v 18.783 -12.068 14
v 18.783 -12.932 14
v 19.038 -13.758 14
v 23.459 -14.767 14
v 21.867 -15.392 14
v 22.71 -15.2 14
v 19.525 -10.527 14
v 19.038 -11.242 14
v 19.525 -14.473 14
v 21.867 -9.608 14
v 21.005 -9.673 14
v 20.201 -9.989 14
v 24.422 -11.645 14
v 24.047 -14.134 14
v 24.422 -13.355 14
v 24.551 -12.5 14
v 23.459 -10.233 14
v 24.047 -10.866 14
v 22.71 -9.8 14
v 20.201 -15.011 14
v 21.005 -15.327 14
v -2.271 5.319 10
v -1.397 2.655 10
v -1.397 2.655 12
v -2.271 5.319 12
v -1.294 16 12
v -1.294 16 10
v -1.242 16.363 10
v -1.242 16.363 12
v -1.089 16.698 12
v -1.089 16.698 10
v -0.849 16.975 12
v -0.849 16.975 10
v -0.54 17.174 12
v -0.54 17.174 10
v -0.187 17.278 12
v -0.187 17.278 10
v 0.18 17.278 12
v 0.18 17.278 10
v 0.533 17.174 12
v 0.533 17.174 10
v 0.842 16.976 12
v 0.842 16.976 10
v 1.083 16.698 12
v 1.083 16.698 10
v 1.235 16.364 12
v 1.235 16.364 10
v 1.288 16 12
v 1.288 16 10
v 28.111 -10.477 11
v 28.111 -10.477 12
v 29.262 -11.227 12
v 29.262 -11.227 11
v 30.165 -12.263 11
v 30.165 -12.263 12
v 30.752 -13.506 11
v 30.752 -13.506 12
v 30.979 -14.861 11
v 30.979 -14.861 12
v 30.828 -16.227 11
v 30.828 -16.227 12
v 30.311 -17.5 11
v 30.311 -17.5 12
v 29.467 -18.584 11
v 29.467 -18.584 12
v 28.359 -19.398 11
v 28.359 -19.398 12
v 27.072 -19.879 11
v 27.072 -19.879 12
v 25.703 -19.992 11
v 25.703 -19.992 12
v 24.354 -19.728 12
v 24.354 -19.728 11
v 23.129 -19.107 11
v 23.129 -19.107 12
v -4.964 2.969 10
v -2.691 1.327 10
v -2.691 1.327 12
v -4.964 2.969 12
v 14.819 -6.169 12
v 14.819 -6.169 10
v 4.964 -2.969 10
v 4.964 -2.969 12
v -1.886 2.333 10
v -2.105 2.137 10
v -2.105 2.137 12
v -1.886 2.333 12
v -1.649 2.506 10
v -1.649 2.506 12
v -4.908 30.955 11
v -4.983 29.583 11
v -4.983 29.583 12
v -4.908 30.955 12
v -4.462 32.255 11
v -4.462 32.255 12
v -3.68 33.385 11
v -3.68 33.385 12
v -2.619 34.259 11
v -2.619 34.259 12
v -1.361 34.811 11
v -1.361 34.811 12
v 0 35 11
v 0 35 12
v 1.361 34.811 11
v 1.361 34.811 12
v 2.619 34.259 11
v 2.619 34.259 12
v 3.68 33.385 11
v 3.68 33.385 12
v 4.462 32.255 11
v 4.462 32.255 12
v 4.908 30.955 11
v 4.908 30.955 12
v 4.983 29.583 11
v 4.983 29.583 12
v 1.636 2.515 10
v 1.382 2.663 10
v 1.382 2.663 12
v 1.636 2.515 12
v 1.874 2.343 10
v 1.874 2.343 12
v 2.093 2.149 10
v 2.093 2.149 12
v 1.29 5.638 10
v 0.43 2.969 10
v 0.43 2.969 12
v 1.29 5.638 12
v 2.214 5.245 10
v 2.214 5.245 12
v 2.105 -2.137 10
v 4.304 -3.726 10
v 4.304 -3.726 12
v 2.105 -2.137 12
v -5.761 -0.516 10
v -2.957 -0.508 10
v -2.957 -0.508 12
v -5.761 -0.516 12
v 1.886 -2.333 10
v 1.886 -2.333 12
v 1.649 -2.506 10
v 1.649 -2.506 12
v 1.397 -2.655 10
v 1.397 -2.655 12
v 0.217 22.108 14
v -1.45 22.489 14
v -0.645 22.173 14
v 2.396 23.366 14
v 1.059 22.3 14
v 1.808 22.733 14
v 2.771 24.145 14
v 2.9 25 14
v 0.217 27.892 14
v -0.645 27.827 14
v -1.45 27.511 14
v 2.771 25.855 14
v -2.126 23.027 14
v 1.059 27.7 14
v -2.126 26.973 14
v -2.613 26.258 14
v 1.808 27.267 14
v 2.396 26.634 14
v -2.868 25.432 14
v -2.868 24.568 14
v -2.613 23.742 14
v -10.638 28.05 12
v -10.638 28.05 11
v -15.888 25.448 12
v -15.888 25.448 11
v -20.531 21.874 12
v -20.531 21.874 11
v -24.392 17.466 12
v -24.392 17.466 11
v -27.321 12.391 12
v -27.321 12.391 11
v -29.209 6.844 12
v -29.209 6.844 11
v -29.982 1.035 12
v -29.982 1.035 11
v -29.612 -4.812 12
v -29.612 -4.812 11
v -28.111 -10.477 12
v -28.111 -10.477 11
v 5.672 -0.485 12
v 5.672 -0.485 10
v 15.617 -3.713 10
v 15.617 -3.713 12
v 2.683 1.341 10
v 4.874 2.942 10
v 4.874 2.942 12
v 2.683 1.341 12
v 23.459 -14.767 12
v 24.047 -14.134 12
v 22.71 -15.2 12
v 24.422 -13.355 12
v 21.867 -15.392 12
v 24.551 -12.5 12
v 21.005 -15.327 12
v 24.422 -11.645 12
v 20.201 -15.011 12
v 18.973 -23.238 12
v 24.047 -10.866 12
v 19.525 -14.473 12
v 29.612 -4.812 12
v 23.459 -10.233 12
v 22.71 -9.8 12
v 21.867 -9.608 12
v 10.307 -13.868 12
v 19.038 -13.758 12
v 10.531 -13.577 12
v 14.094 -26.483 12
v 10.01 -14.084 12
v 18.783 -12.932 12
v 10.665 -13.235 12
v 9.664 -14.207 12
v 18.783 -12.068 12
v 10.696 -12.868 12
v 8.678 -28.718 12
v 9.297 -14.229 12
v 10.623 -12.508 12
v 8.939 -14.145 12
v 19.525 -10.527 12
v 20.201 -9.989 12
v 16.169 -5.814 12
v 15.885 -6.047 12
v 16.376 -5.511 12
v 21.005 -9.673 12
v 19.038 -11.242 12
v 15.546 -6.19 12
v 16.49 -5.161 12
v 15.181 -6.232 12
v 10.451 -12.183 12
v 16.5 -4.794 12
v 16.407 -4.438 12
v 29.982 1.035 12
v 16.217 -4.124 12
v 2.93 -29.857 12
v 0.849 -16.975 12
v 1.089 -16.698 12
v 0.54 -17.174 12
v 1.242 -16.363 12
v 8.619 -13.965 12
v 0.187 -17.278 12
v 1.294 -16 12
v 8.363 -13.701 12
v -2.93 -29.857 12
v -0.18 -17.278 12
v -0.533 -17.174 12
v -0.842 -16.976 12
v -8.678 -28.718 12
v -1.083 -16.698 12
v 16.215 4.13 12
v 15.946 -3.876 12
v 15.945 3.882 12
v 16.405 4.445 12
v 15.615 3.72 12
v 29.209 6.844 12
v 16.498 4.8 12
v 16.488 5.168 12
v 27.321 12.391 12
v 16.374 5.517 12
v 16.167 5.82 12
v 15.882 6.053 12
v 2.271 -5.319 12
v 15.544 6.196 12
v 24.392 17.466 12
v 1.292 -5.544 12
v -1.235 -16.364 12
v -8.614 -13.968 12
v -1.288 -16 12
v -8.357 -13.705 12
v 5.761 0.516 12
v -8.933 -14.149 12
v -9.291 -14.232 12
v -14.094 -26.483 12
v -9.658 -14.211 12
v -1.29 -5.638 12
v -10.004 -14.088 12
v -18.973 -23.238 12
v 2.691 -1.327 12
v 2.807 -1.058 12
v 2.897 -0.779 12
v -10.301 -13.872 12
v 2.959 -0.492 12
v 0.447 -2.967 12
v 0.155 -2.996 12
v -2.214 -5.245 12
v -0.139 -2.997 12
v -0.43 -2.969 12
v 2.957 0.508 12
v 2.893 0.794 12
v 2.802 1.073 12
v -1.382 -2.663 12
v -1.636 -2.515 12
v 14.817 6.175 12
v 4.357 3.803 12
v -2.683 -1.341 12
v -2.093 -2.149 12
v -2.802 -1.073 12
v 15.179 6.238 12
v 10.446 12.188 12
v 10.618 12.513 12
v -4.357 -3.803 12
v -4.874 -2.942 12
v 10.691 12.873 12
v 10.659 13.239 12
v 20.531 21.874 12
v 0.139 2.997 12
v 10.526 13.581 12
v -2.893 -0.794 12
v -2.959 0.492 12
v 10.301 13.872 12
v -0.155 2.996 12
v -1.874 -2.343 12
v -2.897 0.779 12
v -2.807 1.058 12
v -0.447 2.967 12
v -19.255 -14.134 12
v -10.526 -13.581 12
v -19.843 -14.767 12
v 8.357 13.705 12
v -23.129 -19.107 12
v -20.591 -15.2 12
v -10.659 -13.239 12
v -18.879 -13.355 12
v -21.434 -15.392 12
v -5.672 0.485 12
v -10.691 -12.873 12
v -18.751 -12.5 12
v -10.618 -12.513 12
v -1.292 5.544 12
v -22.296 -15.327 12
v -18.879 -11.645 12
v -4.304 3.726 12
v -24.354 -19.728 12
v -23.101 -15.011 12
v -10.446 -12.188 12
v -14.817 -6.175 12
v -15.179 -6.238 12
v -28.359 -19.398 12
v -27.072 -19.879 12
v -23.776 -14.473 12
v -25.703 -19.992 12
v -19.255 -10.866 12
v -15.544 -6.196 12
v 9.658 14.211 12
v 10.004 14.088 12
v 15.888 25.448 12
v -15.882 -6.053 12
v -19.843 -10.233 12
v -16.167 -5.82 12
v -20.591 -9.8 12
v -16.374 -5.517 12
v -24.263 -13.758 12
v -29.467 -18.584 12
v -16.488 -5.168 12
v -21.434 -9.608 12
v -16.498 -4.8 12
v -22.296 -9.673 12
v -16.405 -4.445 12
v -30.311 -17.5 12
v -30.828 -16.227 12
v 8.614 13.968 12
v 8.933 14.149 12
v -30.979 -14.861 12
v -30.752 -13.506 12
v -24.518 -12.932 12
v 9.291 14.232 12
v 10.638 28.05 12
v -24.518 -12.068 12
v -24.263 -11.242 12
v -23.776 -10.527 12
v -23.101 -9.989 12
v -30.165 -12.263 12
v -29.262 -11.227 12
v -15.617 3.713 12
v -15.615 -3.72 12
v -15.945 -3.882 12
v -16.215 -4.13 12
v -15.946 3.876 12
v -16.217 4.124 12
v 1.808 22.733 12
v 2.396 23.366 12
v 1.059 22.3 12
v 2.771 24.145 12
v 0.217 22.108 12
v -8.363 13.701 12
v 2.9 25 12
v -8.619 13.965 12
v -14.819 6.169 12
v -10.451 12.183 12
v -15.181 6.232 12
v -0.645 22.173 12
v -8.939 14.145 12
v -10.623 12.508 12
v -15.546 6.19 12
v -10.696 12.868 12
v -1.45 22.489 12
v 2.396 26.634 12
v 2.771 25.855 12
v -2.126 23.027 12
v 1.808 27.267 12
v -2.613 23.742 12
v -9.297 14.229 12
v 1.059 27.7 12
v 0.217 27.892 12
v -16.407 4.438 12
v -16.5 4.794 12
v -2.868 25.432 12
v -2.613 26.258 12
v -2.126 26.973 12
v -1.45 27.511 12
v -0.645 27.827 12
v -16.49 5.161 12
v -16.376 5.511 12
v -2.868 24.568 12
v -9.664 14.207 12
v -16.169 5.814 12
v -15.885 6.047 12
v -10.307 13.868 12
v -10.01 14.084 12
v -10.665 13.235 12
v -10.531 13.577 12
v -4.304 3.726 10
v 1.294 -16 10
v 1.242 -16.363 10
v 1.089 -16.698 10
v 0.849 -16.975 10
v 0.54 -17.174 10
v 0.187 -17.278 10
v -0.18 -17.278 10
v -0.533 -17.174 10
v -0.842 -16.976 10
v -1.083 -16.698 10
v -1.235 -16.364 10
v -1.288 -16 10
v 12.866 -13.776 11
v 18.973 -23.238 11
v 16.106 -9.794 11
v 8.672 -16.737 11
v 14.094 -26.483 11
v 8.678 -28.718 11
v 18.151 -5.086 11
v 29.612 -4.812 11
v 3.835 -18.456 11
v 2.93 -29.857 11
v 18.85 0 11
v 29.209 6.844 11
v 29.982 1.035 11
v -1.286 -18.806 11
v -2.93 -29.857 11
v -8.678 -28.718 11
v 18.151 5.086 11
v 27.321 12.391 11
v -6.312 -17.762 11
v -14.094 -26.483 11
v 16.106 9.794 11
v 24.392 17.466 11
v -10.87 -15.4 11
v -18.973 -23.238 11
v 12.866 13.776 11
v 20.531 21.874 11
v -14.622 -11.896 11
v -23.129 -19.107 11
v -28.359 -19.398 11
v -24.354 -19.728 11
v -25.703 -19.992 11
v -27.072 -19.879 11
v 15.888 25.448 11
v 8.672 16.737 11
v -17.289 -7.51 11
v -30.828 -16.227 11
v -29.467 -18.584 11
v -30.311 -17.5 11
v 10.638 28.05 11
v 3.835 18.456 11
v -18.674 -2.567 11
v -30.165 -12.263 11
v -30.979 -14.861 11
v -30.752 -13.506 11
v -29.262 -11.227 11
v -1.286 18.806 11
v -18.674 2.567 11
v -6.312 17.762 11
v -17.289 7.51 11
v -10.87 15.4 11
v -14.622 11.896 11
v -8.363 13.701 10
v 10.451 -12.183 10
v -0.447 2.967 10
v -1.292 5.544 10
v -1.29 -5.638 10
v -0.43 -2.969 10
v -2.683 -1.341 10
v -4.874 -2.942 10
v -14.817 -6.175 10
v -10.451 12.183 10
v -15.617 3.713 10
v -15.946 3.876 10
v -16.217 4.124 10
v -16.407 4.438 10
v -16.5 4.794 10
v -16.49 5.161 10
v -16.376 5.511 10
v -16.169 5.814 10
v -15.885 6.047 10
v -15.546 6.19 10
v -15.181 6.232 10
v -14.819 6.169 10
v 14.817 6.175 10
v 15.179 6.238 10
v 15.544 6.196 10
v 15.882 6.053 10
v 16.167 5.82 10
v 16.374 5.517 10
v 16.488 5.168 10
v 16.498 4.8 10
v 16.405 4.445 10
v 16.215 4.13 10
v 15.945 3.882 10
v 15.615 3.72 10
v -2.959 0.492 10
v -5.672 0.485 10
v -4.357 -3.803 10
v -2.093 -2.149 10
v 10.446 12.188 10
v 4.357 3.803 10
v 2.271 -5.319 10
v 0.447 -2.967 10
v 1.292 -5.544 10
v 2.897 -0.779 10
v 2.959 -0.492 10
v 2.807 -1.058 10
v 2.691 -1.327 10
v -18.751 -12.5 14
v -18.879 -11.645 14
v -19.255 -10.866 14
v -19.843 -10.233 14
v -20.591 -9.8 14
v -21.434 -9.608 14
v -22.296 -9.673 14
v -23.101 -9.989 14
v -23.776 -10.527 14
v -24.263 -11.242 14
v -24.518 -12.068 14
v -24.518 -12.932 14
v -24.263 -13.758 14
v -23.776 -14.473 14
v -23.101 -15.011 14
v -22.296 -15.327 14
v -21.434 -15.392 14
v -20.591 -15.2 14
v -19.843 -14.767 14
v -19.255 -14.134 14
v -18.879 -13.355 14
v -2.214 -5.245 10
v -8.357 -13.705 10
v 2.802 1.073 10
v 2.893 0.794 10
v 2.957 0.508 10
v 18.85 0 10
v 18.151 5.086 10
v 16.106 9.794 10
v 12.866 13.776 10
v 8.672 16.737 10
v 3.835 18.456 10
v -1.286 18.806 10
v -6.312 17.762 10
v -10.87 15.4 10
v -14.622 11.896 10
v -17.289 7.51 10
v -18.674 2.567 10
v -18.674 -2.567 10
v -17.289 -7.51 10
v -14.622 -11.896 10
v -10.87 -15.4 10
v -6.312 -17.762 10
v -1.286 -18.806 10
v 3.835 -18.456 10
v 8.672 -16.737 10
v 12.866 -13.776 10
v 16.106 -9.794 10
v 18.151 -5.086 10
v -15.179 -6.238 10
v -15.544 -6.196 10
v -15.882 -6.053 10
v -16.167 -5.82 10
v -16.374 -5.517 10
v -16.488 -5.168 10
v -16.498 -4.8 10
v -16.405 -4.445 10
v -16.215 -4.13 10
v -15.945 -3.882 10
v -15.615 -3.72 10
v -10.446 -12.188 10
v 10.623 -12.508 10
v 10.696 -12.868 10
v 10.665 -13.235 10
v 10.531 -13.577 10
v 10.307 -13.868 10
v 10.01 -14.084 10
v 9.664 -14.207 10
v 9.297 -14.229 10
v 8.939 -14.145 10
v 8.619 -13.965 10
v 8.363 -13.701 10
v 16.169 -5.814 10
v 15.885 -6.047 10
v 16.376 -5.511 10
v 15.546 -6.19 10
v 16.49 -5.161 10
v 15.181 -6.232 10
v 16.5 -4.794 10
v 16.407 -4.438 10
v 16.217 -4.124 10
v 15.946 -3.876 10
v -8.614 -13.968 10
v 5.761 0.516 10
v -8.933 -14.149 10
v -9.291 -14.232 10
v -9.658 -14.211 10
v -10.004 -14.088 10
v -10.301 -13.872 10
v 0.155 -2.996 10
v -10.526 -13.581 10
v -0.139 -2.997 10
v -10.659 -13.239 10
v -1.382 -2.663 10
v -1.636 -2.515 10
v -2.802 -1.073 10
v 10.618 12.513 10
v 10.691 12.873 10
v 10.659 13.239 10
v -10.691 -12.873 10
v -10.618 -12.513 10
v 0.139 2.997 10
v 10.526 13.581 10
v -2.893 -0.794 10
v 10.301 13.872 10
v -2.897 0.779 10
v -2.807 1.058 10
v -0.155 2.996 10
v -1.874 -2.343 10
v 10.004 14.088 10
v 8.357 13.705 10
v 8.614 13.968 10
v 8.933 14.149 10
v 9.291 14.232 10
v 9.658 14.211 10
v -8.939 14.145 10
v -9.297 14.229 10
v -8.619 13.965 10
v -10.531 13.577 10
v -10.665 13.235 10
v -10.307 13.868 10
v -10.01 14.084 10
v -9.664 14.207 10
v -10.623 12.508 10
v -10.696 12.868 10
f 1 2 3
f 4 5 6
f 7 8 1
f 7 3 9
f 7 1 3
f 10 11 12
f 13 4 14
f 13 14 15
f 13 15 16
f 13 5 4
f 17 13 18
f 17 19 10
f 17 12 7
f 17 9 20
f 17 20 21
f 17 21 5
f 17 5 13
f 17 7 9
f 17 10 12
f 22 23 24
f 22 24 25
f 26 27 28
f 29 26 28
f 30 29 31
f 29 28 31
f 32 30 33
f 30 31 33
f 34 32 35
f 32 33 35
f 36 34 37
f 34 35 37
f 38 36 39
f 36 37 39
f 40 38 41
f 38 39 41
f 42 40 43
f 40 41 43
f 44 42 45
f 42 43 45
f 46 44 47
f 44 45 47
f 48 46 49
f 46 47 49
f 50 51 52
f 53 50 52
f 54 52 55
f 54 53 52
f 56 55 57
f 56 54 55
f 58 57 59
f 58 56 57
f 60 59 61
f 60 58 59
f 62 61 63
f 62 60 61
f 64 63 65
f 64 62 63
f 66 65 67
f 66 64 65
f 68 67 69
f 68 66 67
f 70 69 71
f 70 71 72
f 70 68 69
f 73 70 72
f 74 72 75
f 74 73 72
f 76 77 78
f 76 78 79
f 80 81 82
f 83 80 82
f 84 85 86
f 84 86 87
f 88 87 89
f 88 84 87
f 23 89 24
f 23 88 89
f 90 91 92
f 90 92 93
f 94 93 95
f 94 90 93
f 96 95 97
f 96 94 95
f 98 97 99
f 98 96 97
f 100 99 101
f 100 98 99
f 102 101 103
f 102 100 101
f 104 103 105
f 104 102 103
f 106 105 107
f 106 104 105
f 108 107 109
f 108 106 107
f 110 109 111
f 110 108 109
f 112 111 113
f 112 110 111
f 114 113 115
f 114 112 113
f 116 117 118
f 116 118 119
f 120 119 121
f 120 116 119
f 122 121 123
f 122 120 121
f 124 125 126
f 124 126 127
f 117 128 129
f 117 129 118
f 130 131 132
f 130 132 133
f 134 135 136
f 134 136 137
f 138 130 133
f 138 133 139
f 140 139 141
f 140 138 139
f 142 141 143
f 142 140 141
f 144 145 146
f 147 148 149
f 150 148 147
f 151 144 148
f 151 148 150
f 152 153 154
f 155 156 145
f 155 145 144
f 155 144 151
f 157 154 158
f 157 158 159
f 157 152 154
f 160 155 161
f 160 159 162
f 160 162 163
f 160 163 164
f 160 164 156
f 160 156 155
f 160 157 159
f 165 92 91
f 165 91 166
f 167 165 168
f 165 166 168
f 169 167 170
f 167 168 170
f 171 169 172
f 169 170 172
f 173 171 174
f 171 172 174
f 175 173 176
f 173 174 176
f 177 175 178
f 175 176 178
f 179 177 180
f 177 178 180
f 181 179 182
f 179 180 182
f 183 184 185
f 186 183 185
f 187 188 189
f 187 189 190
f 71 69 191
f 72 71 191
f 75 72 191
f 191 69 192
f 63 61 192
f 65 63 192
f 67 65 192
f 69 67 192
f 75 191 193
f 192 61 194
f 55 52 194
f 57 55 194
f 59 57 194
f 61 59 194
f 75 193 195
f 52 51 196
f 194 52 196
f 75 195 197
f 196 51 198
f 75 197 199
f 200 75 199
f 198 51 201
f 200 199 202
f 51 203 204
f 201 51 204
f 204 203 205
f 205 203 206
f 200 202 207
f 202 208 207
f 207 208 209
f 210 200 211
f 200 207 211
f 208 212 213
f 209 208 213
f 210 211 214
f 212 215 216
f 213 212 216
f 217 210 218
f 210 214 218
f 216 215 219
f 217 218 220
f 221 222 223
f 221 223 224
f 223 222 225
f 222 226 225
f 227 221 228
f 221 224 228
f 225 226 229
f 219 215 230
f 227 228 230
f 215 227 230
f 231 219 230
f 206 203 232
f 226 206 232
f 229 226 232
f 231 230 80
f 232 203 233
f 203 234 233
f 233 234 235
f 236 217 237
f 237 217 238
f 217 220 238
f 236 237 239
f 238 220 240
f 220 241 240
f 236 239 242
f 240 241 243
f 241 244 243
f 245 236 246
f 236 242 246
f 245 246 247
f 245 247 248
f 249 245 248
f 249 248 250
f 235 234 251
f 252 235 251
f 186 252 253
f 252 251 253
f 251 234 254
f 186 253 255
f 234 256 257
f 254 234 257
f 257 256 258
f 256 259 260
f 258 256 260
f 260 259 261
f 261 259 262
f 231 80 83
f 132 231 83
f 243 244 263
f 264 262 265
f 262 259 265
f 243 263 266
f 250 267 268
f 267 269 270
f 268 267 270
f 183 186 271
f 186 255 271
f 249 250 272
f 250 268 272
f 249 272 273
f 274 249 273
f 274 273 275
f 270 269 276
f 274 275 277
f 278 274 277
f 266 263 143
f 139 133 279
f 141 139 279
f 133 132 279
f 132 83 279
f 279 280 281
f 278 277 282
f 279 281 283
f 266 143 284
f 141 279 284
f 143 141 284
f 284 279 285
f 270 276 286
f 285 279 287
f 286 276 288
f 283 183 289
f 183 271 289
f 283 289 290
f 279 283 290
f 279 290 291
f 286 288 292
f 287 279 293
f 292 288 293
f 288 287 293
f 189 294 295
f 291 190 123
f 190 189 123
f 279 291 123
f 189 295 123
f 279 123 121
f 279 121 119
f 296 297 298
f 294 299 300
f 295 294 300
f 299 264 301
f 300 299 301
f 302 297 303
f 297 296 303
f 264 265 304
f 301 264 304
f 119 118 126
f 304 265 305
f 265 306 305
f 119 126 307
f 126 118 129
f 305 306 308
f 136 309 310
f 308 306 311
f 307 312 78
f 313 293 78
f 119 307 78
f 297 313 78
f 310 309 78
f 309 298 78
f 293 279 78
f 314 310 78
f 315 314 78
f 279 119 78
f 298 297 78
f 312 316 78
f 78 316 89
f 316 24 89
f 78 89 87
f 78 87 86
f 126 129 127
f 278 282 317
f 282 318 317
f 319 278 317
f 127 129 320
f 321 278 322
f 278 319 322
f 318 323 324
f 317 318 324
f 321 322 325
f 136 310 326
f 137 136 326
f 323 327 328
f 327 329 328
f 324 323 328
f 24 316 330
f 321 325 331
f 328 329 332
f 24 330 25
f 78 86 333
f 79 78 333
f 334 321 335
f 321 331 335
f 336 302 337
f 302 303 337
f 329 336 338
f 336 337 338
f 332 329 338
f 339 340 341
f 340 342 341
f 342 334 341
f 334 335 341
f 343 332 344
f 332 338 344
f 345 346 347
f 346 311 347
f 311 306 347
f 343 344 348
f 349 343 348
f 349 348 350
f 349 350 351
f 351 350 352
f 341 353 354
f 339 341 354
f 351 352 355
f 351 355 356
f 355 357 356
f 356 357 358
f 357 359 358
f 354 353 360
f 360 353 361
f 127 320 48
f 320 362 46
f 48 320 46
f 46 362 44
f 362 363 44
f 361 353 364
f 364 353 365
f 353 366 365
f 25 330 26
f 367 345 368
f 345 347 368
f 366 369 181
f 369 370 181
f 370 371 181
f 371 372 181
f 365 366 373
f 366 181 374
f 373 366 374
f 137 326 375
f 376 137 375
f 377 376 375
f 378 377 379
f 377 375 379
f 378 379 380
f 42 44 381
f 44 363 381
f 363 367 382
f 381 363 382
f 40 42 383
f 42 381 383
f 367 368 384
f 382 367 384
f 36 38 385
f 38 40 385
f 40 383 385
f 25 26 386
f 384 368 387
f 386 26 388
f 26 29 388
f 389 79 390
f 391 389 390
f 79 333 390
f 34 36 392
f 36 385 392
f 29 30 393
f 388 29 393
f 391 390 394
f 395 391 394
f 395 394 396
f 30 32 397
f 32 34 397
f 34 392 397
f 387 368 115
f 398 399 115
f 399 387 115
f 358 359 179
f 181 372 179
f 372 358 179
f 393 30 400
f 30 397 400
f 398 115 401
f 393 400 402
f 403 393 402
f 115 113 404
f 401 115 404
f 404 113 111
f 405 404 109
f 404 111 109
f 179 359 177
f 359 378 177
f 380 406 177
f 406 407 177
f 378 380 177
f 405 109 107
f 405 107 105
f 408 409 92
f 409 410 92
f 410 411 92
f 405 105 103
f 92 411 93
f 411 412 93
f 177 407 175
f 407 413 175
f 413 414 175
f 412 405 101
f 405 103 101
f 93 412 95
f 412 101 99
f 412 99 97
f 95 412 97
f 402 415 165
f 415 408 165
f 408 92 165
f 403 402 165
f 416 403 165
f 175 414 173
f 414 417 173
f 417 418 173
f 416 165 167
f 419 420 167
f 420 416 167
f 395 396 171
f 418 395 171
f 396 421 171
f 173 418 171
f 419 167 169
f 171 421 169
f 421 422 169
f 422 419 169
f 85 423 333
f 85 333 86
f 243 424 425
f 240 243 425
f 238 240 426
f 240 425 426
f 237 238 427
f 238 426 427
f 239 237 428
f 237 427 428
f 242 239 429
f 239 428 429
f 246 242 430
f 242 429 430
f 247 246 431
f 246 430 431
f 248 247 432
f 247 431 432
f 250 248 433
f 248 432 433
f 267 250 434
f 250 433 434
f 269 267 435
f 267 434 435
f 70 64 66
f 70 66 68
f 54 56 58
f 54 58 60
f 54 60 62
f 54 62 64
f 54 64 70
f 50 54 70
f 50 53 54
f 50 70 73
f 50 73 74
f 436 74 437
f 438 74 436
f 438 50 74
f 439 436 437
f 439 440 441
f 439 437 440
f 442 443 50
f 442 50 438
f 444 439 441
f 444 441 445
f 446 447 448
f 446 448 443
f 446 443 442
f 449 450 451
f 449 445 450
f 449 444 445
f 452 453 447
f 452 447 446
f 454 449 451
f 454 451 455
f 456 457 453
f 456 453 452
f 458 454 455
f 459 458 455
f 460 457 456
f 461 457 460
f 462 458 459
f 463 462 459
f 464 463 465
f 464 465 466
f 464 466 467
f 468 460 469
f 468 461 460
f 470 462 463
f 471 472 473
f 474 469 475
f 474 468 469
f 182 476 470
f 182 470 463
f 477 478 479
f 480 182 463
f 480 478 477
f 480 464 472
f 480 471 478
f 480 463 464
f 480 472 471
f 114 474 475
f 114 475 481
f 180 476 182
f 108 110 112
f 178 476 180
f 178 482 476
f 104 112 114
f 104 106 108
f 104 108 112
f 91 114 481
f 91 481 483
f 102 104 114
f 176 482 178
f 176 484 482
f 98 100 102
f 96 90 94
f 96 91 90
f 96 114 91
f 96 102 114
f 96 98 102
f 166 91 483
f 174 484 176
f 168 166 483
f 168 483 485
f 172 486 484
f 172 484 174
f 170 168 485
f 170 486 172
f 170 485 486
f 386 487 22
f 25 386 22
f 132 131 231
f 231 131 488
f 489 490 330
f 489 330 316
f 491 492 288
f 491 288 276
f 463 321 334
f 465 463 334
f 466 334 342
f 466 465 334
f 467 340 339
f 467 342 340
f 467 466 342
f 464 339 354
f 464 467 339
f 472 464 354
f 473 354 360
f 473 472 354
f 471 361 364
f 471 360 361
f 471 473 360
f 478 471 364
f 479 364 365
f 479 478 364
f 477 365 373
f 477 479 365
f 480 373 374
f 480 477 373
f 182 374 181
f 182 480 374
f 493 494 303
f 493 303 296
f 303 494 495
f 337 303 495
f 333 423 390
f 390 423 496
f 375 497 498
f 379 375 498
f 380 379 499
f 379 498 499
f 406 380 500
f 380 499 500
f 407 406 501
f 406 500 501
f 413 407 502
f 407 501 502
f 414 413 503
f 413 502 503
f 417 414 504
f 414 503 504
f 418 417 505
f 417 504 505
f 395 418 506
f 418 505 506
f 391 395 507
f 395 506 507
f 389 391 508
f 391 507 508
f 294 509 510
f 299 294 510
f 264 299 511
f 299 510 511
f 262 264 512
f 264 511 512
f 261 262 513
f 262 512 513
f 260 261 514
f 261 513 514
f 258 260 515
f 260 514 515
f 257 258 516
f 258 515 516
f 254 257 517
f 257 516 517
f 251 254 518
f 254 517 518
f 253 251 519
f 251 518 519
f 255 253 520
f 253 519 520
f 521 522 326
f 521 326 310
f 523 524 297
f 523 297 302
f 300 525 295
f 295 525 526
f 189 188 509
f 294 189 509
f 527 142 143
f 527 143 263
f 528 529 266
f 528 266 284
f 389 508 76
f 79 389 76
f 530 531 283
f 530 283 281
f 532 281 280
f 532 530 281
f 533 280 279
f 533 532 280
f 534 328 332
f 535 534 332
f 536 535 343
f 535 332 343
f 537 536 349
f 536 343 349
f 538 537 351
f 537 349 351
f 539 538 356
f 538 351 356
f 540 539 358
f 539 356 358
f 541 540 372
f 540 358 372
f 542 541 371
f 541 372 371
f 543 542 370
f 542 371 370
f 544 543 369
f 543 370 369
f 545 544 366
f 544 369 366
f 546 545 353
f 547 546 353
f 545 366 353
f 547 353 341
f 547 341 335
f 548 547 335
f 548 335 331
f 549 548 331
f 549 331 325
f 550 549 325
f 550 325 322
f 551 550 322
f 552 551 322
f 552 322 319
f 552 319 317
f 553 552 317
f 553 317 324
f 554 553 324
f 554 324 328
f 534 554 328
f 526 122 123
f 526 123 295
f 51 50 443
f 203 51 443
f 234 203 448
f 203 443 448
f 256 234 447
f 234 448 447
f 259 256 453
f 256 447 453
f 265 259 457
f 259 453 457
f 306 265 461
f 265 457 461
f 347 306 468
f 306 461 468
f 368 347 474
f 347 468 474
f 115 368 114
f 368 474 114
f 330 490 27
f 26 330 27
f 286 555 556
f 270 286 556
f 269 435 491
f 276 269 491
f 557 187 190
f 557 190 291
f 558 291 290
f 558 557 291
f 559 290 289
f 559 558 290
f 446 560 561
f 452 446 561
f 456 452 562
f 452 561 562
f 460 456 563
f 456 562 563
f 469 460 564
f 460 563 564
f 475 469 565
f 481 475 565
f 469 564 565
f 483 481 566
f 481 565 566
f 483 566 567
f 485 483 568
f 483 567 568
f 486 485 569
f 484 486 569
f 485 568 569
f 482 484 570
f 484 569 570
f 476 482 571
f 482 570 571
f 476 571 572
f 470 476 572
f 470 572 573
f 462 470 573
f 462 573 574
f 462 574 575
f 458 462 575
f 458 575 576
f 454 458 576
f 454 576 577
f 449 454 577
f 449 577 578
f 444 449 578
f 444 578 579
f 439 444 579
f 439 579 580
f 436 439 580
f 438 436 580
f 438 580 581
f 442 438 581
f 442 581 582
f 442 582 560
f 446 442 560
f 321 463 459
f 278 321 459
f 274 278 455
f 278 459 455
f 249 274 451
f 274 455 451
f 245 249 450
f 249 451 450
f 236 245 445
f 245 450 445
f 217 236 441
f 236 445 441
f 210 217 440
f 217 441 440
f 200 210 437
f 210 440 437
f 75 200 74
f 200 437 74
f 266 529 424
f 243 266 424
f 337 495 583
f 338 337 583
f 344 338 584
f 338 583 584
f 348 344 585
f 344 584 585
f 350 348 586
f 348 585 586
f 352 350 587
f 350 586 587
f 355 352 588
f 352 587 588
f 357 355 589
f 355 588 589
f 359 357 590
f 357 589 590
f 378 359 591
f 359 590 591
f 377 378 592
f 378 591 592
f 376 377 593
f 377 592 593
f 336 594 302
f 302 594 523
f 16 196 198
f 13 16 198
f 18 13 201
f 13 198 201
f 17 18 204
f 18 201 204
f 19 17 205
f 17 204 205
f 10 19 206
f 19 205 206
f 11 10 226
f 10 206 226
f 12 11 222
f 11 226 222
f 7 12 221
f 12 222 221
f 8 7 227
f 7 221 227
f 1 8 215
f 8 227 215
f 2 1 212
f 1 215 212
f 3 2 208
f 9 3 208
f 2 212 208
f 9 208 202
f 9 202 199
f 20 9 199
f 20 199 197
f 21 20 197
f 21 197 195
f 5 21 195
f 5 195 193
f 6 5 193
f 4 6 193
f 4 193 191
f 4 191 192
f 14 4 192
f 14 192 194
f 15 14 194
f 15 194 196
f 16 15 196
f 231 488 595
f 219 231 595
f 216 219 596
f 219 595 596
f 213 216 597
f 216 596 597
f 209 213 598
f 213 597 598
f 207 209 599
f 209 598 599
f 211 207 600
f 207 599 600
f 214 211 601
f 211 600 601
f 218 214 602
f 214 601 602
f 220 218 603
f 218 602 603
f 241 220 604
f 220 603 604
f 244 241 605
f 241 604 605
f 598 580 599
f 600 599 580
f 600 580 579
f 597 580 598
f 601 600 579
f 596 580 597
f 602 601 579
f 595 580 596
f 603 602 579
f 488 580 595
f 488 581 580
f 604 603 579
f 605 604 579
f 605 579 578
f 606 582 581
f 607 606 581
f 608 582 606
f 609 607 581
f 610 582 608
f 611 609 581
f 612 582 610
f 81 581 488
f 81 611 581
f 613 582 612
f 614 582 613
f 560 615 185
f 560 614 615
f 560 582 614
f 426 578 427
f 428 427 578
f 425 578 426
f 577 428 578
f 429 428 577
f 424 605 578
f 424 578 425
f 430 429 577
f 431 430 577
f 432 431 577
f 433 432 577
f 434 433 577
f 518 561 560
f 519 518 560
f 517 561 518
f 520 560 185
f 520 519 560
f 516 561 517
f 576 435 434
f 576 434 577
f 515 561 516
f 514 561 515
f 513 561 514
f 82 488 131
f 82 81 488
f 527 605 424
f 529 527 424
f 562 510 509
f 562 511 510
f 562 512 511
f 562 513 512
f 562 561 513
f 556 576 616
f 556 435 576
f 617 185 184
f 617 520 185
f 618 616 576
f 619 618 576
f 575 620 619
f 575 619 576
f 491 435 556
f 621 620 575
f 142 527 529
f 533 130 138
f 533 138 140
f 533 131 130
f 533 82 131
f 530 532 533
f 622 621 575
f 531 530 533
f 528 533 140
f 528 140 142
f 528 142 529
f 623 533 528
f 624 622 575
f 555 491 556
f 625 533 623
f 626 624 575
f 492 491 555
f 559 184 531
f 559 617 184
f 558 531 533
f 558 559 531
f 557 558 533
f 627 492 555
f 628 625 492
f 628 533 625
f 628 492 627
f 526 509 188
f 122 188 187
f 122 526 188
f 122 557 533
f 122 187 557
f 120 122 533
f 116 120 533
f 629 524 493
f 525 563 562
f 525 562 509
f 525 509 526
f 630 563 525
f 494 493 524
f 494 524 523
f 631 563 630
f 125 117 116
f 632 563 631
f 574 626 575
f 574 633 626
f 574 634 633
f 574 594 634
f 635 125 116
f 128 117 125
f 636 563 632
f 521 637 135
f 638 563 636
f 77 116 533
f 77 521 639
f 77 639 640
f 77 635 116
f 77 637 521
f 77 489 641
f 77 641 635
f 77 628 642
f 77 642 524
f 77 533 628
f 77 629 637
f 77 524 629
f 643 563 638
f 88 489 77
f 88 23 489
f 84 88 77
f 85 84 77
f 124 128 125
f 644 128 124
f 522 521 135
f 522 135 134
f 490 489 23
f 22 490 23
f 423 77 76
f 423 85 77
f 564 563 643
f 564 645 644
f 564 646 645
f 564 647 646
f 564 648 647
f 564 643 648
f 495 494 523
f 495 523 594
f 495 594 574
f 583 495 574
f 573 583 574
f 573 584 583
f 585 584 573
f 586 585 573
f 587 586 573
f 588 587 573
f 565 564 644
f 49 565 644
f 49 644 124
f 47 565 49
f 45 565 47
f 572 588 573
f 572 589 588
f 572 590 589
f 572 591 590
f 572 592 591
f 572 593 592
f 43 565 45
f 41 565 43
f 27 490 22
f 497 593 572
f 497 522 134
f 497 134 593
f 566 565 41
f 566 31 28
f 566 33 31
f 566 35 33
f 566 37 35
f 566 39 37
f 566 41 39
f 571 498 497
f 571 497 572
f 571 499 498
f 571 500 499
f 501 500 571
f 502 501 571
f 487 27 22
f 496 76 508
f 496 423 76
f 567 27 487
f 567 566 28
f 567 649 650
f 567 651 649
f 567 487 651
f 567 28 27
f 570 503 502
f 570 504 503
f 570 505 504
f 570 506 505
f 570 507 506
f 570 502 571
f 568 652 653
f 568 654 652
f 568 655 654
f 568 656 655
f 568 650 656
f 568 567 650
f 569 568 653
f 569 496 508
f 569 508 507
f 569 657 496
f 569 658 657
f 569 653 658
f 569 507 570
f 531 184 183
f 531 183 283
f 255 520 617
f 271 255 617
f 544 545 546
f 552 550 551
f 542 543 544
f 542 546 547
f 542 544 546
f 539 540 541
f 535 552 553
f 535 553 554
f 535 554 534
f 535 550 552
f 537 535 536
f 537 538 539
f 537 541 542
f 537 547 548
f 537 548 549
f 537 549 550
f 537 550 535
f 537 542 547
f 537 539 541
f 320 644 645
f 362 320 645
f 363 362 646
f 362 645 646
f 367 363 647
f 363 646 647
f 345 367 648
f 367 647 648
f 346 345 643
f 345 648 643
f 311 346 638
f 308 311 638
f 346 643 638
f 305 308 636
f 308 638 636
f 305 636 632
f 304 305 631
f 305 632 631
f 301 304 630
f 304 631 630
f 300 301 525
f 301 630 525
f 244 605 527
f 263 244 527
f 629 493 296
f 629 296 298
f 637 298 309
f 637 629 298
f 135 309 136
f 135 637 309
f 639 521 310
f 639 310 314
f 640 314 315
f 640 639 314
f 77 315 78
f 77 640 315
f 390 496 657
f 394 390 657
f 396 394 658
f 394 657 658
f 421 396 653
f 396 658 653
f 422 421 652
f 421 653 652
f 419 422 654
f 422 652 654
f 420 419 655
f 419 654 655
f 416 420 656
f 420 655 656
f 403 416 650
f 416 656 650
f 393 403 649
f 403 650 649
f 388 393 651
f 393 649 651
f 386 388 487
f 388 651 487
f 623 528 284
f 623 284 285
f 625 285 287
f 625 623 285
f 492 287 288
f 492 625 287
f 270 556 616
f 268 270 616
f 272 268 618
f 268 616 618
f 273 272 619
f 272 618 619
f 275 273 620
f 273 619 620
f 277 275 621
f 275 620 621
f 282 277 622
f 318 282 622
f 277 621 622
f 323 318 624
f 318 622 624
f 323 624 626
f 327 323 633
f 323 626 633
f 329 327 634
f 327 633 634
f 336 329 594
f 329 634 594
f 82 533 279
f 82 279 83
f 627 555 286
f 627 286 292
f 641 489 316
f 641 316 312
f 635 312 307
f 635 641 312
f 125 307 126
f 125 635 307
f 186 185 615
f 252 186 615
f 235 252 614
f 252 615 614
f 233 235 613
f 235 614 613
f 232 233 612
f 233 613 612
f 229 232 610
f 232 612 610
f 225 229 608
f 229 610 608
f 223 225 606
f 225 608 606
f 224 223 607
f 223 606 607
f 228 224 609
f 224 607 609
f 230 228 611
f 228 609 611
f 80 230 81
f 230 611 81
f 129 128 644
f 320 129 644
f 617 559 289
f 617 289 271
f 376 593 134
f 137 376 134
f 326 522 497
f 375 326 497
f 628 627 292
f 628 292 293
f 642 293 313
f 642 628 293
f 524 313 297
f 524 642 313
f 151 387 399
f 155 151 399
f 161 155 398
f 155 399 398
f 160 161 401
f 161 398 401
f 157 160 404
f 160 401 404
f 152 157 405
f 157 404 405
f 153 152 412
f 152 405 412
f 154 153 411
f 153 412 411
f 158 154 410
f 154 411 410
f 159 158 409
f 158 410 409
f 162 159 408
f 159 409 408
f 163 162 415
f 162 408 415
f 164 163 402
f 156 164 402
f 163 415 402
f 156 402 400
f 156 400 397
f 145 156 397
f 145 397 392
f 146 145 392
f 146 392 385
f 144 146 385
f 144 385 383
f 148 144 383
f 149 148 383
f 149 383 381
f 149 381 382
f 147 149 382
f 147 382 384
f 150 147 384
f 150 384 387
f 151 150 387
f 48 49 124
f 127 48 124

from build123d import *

# Parameters (mm, degrees)
SKETCH2_R           = 18.85
BOSS_EXTRUDE1_DEPTH = 2
BOSS_EXTRUDE2_START = -1
SKETCH3_R           = 30
SKETCH3_R_2         = 18.85
BOSS_EXTRUDE2_DEPTH = 1
SKETCH4_R           = 2.9
BOSS_EXTRUDE3_DEPTH = 2
SKETCH6_R           = 5
BOSS_EXTRUDE4_DEPTH = 1
BOSS_EXTRUDE5_DEPTH = 2
SKETCH13_R          = 3
BOSS_EXTRUDE6_DEPTH = 2


with BuildPart() as part:
    # Sketch2 → Boss-Extrude1 (new body)
    with BuildSketch(Plane.XY.offset(10)):
        Circle(SKETCH2_R)
        with BuildLine():
            ThreePointArc((-1.294063412, 15.999741695), (-0.003455665, 17.290865413), (1.287668054, 16.000257666))
            Line((1.287668054, 16.000257666), (1.290071734, 3.973134201))
            Line((1.290071734, 3.973134201), (8.357492916, 13.704694326))
            ThreePointArc((8.357492916, 13.704694326), (10.160519997, 13.990635156), (10.446460828, 12.187608075))
            Line((10.446460828, 12.187608075), (3.379039645, 2.45604795))
            Line((3.379039645, 2.45604795), (14.816771011, 6.17491953))
            ThreePointArc((14.816771011, 6.17491953), (16.443522365, 5.346457793), (15.615060628, 3.71970644))
            Line((15.615060628, 3.71970644), (4.177329262, 0.00083486))
            Line((4.177329262, 0.00083486), (15.616546184, -3.713464648))
            ThreePointArc((15.616546184, -3.713464648), (16.445658083, -5.339884727), (14.819238004, -6.168996626))
            Line((14.819238004, -6.168996626), (3.380021082, -2.454697118))
            Line((3.380021082, -2.454697118), (10.451331501, -12.183431547))
            ThreePointArc((10.451331501, -12.183431547), (10.166111381, -13.986572778), (8.362970151, -13.701352658))
            Line((8.362970151, -13.701352658), (1.291659732, -3.972618229))
            Line((1.291659732, -3.972618229), (1.294063412, -15.999741695))
            ThreePointArc((1.294063412, -15.999741695), (0.003455665, -17.290865413), (-1.287668054, -16.000257666))
            Line((-1.287668054, -16.000257666), (-1.290071734, -3.973134201))
            Line((-1.290071734, -3.973134201), (-8.357492916, -13.704694326))
            ThreePointArc((-8.357492916, -13.704694326), (-10.160519997, -13.990635156), (-10.446460828, -12.187608075))
            Line((-10.446460828, -12.187608075), (-3.379039645, -2.45604795))
            Line((-3.379039645, -2.45604795), (-14.816771011, -6.17491953))
            ThreePointArc((-14.816771011, -6.17491953), (-16.443522365, -5.346457793), (-15.615060628, -3.71970644))
            Line((-15.615060628, -3.71970644), (-4.177329262, -0.00083486))
            Line((-4.177329262, -0.00083486), (-15.616546184, 3.713464648))
            ThreePointArc((-15.616546184, 3.713464648), (-16.445658083, 5.339884727), (-14.819238004, 6.168996626))
            Line((-14.819238004, 6.168996626), (-3.380021082, 2.454697118))
            Line((-3.380021082, 2.454697118), (-10.451331501, 12.183431547))
            ThreePointArc((-10.451331501, 12.183431547), (-10.166111381, 13.986572778), (-8.362970151, 13.701352658))
            Line((-8.362970151, 13.701352658), (-1.291659732, 3.972618229))
            Line((-1.291659732, 3.972618229), (-1.294063412, 15.999741695))
        make_face(mode=Mode.SUBTRACT)
    extrude(amount=BOSS_EXTRUDE1_DEPTH)

    # Sketch3 → Boss-Extrude2 (add)
    with BuildSketch(Plane.XY.offset(12).offset(BOSS_EXTRUDE2_START)):
        Circle(SKETCH3_R)
        Circle(SKETCH3_R_2, mode=Mode.SUBTRACT)
    extrude(amount=BOSS_EXTRUDE2_DEPTH)

    # Sketch4 → Boss-Extrude3 (add)
    with BuildSketch(Plane.XY.offset(12)):
        with Locations((0, 25)):
            Circle(SKETCH4_R)
        with Locations((21.650635095, -12.5)):
            Circle(SKETCH4_R)
        with Locations((-21.650635095, -12.5)):
            Circle(SKETCH4_R)
    extrude(amount=BOSS_EXTRUDE3_DEPTH)

    # Sketch6 → Boss-Extrude4 (add)
    with BuildSketch(Plane(origin=(0, 0, 11), x_dir=(-1, 0, 0), z_dir=(0, 0, -1))):
        with Locations((0, 30)):
            Circle(SKETCH6_R)
        with Locations((25.980762114, -15)):
            Circle(SKETCH6_R)
        with Locations((-25.980762114, -15)):
            Circle(SKETCH6_R)
    extrude(amount=-BOSS_EXTRUDE4_DEPTH)

    # Sketch12 → Boss-Extrude5 (add)
    with BuildSketch(Plane(origin=(0, 0, 10), x_dir=(-1, 0, 0), z_dir=(0, 0, -1))):
        with BuildLine():
            Line((-2.213684697, 5.244912811), (-1.382375366, 2.662524807))
            ThreePointArc((-1.382375366, 2.662524807), (-0.919286358, 2.855680758), (-0.43048178, 2.968953593))
            Line((-0.43048178, 2.968953593), (-1.28973897, 5.638159118))
            Line((-1.28973897, 5.638159118), (-1.290071734, 3.973134201))
            Line((-1.290071734, 3.973134201), (-2.213684697, 5.244912811))
        make_face()
        with BuildLine():
            Line((1.291973859, 5.544394816), (0.446627652, 2.96656767))
            ThreePointArc((0.446627652, 2.96656767), (0.934808749, 2.850637228), (1.396840061, 2.654964754))
            Line((1.396840061, 2.654964754), (2.270606035, 5.31945609))
            Line((2.270606035, 5.31945609), (1.291659732, 3.972618229))
            Line((1.291659732, 3.972618229), (1.291973859, 5.544394816))
        make_face()
        with BuildLine():
            ThreePointArc((2.105034087, 2.137482513), (2.431838686, 1.756747166), (2.690616475, 1.326869617))
            Line((2.690616475, 1.326869617), (4.963656709, 2.968901637))
            Line((4.963656709, 2.968901637), (3.380021082, 2.454697118))
            Line((3.380021082, 2.454697118), (4.304142315, 3.726106449))
            Line((4.304142315, 3.726106449), (2.105034087, 2.137482513))
        make_face()
        with BuildLine():
            ThreePointArc((3, 0), (2.989147583, -0.254944562), (2.956668847, -0.508044614))
            Line((2.956668847, -0.508044614), (5.76075923, -0.515672332))
            Line((5.76075923, -0.515672332), (4.177329262, -0.00083486))
            Line((4.177329262, -0.00083486), (5.672274698, 0.484572064))
            Line((5.672274698, 0.484572064), (2.959389048, 0.491951686))
            ThreePointArc((2.959389048, 0.491951686), (2.989830024, 0.246812536), (3, 0))
        make_face()
        with BuildLine():
            ThreePointArc((2.683357979, -1.341487964), (2.422245321, -1.7699513), (2.093374212, -2.148903071))
            Line((2.093374212, -2.148903071), (4.357447525, -3.803276998))
            Line((4.357447525, -3.803276998), (3.379039645, -2.45604795))
            Line((3.379039645, -2.45604795), (4.87379094, -2.94205238))
            Line((4.87379094, -2.94205238), (2.683357979, -1.341487964))
        make_face()
        with BuildLine():
            ThreePointArc((1.382375366, -2.662524807), (0.919286358, -2.855680758), (0.43048178, -2.968953593))
            Line((0.43048178, -2.968953593), (1.28973897, -5.638159118))
            Line((1.28973897, -5.638159118), (1.290071734, -3.973134201))
            Line((1.290071734, -3.973134201), (2.213684697, -5.244912811))
            Line((2.213684697, -5.244912811), (1.382375366, -2.662524807))
        make_face()
        with BuildLine():
            Line((-1.396840061, -2.654964754), (-2.270606035, -5.31945609))
            Line((-2.270606035, -5.31945609), (-1.291659732, -3.972618229))
            Line((-1.291659732, -3.972618229), (-1.291973859, -5.544394816))
            Line((-1.291973859, -5.544394816), (-0.446627652, -2.96656767))
            ThreePointArc((-0.446627652, -2.96656767), (-0.934808749, -2.850637228), (-1.396840061, -2.654964754))
        make_face()
        with BuildLine():
            Line((-4.304142315, -3.726106449), (-2.105034087, -2.137482513))
            ThreePointArc((-2.105034087, -2.137482513), (-2.431838686, -1.756747166), (-2.690616475, -1.326869617))
            Line((-2.690616475, -1.326869617), (-4.963656709, -2.968901637))
            Line((-4.963656709, -2.968901637), (-3.380021082, -2.454697118))
            Line((-3.380021082, -2.454697118), (-4.304142315, -3.726106449))
        make_face()
        with BuildLine():
            Line((-5.672274698, -0.484572064), (-2.959389048, -0.491951686))
            ThreePointArc((-2.959389048, -0.491951686), (-2.999988901, 0.008160604), (-2.956668847, 0.508044614))
            Line((-2.956668847, 0.508044614), (-5.76075923, 0.515672332))
            Line((-5.76075923, 0.515672332), (-4.177329262, 0.00083486))
            Line((-4.177329262, 0.00083486), (-5.672274698, -0.484572064))
        make_face()
        with BuildLine():
            Line((-4.87379094, 2.94205238), (-2.683357979, 1.341487964))
            ThreePointArc((-2.683357979, 1.341487964), (-2.422245321, 1.7699513), (-2.093374212, 2.148903071))
            Line((-2.093374212, 2.148903071), (-4.357447525, 3.803276998))
            Line((-4.357447525, 3.803276998), (-3.379039645, 2.45604795))
            Line((-3.379039645, 2.45604795), (-4.87379094, 2.94205238))
        make_face()
    extrude(amount=-BOSS_EXTRUDE5_DEPTH)

    # Sketch13 → Boss-Extrude6 (add)
    with BuildSketch(Plane(origin=(0, 0, 10), x_dir=(-1, 0, 0), z_dir=(0, 0, -1))):
        Circle(SKETCH13_R)
    extrude(amount=-BOSS_EXTRUDE6_DEPTH)


solid = part.part
